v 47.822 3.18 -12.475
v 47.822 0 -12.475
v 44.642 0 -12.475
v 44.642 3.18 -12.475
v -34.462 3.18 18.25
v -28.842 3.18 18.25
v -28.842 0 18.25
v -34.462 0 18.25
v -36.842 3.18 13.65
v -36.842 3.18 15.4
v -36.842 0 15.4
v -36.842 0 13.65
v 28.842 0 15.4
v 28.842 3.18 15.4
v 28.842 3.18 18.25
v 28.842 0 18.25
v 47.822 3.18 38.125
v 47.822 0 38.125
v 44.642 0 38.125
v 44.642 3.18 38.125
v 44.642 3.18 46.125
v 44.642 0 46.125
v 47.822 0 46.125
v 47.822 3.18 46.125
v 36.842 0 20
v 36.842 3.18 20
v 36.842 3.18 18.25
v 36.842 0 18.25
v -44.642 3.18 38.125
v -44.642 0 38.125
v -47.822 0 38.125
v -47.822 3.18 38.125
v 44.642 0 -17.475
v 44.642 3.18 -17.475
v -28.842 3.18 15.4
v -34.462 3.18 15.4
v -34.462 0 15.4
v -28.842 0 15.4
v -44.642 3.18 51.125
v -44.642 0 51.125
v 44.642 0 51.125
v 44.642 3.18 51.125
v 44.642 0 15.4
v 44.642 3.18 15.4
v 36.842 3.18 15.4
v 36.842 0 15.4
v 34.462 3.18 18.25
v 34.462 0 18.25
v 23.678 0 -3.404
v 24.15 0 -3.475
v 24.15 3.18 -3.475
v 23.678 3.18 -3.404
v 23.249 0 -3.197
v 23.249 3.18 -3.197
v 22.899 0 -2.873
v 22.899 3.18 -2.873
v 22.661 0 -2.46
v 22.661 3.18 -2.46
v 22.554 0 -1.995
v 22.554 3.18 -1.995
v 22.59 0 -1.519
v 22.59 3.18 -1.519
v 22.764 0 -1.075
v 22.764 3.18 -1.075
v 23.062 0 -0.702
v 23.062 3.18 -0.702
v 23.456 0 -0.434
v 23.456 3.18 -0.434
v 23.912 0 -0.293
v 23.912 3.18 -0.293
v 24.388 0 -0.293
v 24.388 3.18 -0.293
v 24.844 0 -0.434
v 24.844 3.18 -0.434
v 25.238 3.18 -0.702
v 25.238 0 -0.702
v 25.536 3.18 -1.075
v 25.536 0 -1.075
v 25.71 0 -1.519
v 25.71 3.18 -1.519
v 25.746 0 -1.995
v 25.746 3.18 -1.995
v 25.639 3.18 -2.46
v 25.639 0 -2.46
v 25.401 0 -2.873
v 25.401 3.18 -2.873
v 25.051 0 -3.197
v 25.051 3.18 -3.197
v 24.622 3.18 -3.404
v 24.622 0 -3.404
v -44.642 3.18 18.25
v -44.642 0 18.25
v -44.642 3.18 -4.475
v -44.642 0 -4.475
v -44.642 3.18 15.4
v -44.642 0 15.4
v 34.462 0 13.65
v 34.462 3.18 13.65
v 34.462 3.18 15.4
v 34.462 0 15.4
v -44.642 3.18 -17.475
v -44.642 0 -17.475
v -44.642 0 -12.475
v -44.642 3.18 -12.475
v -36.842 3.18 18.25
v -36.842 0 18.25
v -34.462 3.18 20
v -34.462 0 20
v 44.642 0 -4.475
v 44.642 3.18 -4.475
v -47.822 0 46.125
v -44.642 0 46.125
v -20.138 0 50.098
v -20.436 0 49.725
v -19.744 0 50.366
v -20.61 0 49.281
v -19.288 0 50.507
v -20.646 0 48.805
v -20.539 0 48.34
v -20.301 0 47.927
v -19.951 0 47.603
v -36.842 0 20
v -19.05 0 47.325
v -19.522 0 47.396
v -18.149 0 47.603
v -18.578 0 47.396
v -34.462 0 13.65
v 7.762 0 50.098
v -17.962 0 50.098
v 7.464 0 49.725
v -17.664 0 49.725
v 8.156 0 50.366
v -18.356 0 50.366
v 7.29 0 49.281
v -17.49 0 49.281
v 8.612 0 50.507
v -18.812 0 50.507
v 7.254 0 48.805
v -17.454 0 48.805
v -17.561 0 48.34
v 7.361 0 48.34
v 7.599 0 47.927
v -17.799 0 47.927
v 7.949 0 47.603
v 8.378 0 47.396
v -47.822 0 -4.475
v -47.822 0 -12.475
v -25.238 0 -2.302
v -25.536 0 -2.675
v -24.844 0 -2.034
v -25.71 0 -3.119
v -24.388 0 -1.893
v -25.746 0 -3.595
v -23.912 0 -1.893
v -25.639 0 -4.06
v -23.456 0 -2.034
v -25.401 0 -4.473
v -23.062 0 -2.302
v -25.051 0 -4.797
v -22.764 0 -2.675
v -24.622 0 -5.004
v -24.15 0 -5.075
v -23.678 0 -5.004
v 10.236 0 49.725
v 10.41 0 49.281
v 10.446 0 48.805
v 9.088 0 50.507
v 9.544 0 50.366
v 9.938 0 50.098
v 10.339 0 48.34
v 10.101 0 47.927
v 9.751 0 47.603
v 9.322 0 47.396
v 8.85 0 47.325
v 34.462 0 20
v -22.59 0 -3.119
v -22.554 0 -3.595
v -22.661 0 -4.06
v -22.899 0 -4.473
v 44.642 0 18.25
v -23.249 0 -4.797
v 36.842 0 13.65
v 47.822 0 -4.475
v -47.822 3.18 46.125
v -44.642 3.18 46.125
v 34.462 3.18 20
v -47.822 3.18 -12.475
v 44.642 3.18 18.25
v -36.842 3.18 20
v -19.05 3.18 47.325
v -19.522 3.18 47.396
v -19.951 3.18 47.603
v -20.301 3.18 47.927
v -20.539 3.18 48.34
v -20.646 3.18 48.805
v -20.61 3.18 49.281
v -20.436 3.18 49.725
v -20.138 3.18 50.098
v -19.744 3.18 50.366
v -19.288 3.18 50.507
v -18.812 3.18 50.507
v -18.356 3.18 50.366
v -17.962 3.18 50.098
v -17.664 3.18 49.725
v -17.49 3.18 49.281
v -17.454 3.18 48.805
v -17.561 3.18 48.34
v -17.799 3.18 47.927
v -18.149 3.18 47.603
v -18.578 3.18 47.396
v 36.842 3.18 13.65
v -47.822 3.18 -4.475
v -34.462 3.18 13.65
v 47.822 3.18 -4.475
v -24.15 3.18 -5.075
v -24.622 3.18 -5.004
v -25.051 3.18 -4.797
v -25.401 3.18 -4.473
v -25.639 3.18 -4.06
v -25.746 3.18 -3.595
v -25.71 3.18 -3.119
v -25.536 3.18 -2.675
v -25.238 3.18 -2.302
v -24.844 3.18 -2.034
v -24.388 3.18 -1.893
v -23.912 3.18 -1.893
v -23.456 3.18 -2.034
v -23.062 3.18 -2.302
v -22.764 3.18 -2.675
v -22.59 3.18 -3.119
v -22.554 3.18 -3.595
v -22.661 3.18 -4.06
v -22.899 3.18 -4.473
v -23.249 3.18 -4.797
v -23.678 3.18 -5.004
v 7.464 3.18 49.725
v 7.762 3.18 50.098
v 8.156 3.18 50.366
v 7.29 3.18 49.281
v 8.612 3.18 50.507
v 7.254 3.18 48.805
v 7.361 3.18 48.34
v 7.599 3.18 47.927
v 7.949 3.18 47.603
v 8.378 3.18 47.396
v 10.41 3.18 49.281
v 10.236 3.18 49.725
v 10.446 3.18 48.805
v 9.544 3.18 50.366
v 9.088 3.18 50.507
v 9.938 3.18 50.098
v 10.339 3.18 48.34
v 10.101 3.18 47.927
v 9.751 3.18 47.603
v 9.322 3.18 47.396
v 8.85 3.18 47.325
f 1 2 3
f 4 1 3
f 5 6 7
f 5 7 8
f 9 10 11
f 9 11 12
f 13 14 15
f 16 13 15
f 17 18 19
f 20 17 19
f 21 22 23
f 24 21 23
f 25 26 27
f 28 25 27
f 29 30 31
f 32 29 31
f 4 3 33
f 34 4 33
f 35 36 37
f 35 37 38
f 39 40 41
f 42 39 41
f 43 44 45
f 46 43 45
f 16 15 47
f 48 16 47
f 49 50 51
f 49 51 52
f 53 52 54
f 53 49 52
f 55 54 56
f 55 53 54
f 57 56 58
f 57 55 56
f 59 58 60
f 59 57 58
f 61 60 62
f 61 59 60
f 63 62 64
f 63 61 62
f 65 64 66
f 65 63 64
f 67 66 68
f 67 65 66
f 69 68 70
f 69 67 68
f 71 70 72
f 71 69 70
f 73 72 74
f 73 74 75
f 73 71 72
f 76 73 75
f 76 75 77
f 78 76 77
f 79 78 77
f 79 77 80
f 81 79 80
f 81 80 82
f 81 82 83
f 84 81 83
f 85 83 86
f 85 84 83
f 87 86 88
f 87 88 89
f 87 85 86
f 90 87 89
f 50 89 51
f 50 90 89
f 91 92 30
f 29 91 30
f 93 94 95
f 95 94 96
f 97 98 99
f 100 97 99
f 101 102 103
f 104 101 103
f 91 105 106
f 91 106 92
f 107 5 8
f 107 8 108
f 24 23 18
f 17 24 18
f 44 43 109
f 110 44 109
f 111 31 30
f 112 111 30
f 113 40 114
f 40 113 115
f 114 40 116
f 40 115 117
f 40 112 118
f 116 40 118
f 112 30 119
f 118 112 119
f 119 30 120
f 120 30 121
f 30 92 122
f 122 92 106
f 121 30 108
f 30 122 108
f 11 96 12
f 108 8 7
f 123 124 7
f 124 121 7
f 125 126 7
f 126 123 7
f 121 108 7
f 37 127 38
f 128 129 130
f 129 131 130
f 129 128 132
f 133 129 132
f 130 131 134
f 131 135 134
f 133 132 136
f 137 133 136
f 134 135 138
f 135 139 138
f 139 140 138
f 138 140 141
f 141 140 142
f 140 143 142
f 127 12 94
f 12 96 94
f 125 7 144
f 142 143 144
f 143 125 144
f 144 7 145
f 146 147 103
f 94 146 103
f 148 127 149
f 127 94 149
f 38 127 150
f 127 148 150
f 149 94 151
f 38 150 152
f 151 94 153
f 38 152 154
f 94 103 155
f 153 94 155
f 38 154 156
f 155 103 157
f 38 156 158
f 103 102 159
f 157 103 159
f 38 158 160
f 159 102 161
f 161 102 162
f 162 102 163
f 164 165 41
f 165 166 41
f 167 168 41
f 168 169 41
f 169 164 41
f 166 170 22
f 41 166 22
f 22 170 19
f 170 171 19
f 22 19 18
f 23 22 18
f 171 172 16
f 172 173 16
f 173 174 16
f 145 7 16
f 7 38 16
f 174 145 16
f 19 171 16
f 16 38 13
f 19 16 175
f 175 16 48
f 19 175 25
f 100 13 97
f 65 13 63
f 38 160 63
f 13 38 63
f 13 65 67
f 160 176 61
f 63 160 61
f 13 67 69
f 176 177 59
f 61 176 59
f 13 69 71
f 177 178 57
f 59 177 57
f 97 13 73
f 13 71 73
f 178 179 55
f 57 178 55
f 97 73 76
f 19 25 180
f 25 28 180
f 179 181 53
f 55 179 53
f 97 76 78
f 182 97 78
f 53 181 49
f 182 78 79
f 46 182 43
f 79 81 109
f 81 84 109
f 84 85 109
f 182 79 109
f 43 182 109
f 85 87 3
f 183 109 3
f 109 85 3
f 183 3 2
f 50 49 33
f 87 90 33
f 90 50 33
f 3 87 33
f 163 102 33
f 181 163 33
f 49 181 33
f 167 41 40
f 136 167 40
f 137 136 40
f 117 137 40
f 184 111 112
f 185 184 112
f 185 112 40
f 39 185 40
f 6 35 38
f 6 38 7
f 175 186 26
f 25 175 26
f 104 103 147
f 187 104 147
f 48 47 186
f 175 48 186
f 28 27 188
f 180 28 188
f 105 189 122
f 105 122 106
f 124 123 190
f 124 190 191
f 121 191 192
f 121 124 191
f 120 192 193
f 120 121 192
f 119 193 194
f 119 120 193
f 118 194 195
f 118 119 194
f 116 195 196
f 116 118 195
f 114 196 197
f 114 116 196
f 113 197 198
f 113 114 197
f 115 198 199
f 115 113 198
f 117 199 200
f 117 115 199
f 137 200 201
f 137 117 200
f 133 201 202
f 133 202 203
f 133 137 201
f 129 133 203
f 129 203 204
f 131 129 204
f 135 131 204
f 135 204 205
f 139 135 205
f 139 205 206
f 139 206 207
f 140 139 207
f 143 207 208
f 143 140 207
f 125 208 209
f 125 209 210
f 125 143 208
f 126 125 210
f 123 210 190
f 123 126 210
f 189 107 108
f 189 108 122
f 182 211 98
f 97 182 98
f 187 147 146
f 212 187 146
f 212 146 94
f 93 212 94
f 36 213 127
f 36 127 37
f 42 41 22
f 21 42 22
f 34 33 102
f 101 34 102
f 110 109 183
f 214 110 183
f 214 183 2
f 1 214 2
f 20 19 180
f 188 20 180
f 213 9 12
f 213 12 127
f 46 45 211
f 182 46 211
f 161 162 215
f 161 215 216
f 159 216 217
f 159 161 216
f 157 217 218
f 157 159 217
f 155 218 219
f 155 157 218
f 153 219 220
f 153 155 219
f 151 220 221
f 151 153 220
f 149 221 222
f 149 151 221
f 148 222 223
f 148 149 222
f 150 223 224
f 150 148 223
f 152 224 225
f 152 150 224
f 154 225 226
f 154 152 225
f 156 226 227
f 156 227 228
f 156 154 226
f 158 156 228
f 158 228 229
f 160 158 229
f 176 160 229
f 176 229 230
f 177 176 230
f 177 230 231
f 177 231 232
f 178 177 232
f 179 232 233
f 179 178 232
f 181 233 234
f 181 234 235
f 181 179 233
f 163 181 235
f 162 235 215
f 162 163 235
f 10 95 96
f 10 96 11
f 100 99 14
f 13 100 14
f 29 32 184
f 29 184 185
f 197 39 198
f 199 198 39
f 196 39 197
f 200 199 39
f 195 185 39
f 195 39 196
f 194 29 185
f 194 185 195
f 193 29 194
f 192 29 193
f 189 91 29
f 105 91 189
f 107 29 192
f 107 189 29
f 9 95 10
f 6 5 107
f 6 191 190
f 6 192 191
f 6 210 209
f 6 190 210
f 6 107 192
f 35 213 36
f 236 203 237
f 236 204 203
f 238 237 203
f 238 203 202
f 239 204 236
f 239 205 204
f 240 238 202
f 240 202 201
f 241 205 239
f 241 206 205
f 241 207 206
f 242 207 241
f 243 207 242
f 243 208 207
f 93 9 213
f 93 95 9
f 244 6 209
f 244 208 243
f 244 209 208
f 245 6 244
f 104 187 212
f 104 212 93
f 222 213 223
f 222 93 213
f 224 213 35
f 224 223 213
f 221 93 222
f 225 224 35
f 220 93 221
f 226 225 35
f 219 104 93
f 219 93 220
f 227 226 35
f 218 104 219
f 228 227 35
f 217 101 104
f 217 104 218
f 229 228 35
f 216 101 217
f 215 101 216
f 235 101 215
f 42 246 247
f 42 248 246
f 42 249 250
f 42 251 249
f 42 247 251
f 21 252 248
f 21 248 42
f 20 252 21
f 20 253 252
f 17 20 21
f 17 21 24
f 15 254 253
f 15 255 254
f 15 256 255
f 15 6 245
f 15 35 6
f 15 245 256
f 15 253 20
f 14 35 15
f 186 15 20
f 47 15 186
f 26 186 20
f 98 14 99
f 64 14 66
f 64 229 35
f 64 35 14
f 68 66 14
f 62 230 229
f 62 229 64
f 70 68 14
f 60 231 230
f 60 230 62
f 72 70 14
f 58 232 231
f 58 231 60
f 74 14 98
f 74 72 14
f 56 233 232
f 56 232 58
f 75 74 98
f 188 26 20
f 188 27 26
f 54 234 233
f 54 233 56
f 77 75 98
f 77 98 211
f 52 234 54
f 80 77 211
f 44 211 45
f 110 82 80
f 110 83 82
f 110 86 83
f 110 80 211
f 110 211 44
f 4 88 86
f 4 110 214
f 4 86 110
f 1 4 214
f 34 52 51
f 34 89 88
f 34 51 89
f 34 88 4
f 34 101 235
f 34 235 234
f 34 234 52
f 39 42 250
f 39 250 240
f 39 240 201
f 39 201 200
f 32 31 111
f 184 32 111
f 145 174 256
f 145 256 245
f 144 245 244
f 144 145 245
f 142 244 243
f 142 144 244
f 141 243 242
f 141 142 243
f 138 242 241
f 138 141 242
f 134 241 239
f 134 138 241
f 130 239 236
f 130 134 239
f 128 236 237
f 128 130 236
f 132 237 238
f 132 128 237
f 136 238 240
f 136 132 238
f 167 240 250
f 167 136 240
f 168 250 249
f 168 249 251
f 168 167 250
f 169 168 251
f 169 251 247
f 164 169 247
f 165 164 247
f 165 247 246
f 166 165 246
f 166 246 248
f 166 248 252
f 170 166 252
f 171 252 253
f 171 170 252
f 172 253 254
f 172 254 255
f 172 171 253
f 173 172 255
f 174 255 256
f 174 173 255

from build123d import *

# Parameters (mm, degrees)
SKETCH1_R           = 1.6
BOSS_EXTRUDE1_DEPTH = 3.18
CUT_EXTRUDE1_DEPTH  = 71.077005804


with BuildPart() as part:
    # Sketch1 → Boss-Extrude1 (new body)
    with BuildSketch(Plane(origin=(0, 0, 0), x_dir=(1, 0, 0), z_dir=(0, 1, 0))):
        Polygon((44.64191244, 17.475260069), (-44.64191244, 17.475260069), (-44.64191244, 12.475260069), (-47.82191244, 12.475260069), (-47.82191244, 4.475260069), (-44.64191244, 4.475260069), (-44.64191244, -38.124739931), (-47.82191244, -38.124739931), (-47.82191244, -46.124739931), (-44.64191244, -46.124739931), (-44.64191244, -51.124739931), (44.64191244, -51.124739931), (44.64191244, -46.124739931), (47.82191244, -46.124739931), (47.82191244, -38.124739931), (44.64191244, -38.124739931), (44.64191244, 4.475260069), (47.82191244, 4.475260069), (47.82191244, 12.475260069), (44.64191244, 12.475260069), align=None)
        with Locations(Location((24.15, 1.875260069, 0), (0, 0, 90))):
            Circle(SKETCH1_R, mode=Mode.SUBTRACT)
        with Locations(Location((8.85, -48.924739931, 0), (0, 0, 90))):
            Circle(SKETCH1_R, mode=Mode.SUBTRACT)
        with Locations(Location((-19.05, -48.924739931, 0), (0, 0, 90))):
            Circle(SKETCH1_R, mode=Mode.SUBTRACT)
        with Locations(Location((-24.15, 3.475260069, 0), (0, 0, 90))):
            Circle(SKETCH1_R, mode=Mode.SUBTRACT)
    extrude(amount=BOSS_EXTRUDE1_DEPTH)

    # Sketch2 → Cut-Extrude1 (cut, through all)
    with BuildSketch(Plane(origin=(0, 3.18, 0), x_dir=(1, 0, 0), z_dir=(0, 1, 0))):
        Polygon((-44.64191244, -15.399739931), (-36.84191244, -15.399739931), (-36.84191244, -13.649739931), (-34.46191244, -13.649739931), (-34.46191244, -15.399739931), (-28.84191244, -15.399739931), (-28.84191244, -18.249739931), (-34.46191244, -18.249739931), (-34.46191244, -19.999739931), (-36.84191244, -19.999739931), (-36.84191244, -18.249739931), (-44.64191244, -18.249739931), align=None)
    cut_extrude1 = extrude(amount=-CUT_EXTRUDE1_DEPTH, mode=Mode.SUBTRACT)

    # Mirror1: Cut-Extrude1 across plane
    add(cut_extrude1.mirror(Plane(origin=(0, 0, 0), x_dir=(0, 0, 1), z_dir=(1, 0, 0))), mode=Mode.SUBTRACT)


solid = part.part
